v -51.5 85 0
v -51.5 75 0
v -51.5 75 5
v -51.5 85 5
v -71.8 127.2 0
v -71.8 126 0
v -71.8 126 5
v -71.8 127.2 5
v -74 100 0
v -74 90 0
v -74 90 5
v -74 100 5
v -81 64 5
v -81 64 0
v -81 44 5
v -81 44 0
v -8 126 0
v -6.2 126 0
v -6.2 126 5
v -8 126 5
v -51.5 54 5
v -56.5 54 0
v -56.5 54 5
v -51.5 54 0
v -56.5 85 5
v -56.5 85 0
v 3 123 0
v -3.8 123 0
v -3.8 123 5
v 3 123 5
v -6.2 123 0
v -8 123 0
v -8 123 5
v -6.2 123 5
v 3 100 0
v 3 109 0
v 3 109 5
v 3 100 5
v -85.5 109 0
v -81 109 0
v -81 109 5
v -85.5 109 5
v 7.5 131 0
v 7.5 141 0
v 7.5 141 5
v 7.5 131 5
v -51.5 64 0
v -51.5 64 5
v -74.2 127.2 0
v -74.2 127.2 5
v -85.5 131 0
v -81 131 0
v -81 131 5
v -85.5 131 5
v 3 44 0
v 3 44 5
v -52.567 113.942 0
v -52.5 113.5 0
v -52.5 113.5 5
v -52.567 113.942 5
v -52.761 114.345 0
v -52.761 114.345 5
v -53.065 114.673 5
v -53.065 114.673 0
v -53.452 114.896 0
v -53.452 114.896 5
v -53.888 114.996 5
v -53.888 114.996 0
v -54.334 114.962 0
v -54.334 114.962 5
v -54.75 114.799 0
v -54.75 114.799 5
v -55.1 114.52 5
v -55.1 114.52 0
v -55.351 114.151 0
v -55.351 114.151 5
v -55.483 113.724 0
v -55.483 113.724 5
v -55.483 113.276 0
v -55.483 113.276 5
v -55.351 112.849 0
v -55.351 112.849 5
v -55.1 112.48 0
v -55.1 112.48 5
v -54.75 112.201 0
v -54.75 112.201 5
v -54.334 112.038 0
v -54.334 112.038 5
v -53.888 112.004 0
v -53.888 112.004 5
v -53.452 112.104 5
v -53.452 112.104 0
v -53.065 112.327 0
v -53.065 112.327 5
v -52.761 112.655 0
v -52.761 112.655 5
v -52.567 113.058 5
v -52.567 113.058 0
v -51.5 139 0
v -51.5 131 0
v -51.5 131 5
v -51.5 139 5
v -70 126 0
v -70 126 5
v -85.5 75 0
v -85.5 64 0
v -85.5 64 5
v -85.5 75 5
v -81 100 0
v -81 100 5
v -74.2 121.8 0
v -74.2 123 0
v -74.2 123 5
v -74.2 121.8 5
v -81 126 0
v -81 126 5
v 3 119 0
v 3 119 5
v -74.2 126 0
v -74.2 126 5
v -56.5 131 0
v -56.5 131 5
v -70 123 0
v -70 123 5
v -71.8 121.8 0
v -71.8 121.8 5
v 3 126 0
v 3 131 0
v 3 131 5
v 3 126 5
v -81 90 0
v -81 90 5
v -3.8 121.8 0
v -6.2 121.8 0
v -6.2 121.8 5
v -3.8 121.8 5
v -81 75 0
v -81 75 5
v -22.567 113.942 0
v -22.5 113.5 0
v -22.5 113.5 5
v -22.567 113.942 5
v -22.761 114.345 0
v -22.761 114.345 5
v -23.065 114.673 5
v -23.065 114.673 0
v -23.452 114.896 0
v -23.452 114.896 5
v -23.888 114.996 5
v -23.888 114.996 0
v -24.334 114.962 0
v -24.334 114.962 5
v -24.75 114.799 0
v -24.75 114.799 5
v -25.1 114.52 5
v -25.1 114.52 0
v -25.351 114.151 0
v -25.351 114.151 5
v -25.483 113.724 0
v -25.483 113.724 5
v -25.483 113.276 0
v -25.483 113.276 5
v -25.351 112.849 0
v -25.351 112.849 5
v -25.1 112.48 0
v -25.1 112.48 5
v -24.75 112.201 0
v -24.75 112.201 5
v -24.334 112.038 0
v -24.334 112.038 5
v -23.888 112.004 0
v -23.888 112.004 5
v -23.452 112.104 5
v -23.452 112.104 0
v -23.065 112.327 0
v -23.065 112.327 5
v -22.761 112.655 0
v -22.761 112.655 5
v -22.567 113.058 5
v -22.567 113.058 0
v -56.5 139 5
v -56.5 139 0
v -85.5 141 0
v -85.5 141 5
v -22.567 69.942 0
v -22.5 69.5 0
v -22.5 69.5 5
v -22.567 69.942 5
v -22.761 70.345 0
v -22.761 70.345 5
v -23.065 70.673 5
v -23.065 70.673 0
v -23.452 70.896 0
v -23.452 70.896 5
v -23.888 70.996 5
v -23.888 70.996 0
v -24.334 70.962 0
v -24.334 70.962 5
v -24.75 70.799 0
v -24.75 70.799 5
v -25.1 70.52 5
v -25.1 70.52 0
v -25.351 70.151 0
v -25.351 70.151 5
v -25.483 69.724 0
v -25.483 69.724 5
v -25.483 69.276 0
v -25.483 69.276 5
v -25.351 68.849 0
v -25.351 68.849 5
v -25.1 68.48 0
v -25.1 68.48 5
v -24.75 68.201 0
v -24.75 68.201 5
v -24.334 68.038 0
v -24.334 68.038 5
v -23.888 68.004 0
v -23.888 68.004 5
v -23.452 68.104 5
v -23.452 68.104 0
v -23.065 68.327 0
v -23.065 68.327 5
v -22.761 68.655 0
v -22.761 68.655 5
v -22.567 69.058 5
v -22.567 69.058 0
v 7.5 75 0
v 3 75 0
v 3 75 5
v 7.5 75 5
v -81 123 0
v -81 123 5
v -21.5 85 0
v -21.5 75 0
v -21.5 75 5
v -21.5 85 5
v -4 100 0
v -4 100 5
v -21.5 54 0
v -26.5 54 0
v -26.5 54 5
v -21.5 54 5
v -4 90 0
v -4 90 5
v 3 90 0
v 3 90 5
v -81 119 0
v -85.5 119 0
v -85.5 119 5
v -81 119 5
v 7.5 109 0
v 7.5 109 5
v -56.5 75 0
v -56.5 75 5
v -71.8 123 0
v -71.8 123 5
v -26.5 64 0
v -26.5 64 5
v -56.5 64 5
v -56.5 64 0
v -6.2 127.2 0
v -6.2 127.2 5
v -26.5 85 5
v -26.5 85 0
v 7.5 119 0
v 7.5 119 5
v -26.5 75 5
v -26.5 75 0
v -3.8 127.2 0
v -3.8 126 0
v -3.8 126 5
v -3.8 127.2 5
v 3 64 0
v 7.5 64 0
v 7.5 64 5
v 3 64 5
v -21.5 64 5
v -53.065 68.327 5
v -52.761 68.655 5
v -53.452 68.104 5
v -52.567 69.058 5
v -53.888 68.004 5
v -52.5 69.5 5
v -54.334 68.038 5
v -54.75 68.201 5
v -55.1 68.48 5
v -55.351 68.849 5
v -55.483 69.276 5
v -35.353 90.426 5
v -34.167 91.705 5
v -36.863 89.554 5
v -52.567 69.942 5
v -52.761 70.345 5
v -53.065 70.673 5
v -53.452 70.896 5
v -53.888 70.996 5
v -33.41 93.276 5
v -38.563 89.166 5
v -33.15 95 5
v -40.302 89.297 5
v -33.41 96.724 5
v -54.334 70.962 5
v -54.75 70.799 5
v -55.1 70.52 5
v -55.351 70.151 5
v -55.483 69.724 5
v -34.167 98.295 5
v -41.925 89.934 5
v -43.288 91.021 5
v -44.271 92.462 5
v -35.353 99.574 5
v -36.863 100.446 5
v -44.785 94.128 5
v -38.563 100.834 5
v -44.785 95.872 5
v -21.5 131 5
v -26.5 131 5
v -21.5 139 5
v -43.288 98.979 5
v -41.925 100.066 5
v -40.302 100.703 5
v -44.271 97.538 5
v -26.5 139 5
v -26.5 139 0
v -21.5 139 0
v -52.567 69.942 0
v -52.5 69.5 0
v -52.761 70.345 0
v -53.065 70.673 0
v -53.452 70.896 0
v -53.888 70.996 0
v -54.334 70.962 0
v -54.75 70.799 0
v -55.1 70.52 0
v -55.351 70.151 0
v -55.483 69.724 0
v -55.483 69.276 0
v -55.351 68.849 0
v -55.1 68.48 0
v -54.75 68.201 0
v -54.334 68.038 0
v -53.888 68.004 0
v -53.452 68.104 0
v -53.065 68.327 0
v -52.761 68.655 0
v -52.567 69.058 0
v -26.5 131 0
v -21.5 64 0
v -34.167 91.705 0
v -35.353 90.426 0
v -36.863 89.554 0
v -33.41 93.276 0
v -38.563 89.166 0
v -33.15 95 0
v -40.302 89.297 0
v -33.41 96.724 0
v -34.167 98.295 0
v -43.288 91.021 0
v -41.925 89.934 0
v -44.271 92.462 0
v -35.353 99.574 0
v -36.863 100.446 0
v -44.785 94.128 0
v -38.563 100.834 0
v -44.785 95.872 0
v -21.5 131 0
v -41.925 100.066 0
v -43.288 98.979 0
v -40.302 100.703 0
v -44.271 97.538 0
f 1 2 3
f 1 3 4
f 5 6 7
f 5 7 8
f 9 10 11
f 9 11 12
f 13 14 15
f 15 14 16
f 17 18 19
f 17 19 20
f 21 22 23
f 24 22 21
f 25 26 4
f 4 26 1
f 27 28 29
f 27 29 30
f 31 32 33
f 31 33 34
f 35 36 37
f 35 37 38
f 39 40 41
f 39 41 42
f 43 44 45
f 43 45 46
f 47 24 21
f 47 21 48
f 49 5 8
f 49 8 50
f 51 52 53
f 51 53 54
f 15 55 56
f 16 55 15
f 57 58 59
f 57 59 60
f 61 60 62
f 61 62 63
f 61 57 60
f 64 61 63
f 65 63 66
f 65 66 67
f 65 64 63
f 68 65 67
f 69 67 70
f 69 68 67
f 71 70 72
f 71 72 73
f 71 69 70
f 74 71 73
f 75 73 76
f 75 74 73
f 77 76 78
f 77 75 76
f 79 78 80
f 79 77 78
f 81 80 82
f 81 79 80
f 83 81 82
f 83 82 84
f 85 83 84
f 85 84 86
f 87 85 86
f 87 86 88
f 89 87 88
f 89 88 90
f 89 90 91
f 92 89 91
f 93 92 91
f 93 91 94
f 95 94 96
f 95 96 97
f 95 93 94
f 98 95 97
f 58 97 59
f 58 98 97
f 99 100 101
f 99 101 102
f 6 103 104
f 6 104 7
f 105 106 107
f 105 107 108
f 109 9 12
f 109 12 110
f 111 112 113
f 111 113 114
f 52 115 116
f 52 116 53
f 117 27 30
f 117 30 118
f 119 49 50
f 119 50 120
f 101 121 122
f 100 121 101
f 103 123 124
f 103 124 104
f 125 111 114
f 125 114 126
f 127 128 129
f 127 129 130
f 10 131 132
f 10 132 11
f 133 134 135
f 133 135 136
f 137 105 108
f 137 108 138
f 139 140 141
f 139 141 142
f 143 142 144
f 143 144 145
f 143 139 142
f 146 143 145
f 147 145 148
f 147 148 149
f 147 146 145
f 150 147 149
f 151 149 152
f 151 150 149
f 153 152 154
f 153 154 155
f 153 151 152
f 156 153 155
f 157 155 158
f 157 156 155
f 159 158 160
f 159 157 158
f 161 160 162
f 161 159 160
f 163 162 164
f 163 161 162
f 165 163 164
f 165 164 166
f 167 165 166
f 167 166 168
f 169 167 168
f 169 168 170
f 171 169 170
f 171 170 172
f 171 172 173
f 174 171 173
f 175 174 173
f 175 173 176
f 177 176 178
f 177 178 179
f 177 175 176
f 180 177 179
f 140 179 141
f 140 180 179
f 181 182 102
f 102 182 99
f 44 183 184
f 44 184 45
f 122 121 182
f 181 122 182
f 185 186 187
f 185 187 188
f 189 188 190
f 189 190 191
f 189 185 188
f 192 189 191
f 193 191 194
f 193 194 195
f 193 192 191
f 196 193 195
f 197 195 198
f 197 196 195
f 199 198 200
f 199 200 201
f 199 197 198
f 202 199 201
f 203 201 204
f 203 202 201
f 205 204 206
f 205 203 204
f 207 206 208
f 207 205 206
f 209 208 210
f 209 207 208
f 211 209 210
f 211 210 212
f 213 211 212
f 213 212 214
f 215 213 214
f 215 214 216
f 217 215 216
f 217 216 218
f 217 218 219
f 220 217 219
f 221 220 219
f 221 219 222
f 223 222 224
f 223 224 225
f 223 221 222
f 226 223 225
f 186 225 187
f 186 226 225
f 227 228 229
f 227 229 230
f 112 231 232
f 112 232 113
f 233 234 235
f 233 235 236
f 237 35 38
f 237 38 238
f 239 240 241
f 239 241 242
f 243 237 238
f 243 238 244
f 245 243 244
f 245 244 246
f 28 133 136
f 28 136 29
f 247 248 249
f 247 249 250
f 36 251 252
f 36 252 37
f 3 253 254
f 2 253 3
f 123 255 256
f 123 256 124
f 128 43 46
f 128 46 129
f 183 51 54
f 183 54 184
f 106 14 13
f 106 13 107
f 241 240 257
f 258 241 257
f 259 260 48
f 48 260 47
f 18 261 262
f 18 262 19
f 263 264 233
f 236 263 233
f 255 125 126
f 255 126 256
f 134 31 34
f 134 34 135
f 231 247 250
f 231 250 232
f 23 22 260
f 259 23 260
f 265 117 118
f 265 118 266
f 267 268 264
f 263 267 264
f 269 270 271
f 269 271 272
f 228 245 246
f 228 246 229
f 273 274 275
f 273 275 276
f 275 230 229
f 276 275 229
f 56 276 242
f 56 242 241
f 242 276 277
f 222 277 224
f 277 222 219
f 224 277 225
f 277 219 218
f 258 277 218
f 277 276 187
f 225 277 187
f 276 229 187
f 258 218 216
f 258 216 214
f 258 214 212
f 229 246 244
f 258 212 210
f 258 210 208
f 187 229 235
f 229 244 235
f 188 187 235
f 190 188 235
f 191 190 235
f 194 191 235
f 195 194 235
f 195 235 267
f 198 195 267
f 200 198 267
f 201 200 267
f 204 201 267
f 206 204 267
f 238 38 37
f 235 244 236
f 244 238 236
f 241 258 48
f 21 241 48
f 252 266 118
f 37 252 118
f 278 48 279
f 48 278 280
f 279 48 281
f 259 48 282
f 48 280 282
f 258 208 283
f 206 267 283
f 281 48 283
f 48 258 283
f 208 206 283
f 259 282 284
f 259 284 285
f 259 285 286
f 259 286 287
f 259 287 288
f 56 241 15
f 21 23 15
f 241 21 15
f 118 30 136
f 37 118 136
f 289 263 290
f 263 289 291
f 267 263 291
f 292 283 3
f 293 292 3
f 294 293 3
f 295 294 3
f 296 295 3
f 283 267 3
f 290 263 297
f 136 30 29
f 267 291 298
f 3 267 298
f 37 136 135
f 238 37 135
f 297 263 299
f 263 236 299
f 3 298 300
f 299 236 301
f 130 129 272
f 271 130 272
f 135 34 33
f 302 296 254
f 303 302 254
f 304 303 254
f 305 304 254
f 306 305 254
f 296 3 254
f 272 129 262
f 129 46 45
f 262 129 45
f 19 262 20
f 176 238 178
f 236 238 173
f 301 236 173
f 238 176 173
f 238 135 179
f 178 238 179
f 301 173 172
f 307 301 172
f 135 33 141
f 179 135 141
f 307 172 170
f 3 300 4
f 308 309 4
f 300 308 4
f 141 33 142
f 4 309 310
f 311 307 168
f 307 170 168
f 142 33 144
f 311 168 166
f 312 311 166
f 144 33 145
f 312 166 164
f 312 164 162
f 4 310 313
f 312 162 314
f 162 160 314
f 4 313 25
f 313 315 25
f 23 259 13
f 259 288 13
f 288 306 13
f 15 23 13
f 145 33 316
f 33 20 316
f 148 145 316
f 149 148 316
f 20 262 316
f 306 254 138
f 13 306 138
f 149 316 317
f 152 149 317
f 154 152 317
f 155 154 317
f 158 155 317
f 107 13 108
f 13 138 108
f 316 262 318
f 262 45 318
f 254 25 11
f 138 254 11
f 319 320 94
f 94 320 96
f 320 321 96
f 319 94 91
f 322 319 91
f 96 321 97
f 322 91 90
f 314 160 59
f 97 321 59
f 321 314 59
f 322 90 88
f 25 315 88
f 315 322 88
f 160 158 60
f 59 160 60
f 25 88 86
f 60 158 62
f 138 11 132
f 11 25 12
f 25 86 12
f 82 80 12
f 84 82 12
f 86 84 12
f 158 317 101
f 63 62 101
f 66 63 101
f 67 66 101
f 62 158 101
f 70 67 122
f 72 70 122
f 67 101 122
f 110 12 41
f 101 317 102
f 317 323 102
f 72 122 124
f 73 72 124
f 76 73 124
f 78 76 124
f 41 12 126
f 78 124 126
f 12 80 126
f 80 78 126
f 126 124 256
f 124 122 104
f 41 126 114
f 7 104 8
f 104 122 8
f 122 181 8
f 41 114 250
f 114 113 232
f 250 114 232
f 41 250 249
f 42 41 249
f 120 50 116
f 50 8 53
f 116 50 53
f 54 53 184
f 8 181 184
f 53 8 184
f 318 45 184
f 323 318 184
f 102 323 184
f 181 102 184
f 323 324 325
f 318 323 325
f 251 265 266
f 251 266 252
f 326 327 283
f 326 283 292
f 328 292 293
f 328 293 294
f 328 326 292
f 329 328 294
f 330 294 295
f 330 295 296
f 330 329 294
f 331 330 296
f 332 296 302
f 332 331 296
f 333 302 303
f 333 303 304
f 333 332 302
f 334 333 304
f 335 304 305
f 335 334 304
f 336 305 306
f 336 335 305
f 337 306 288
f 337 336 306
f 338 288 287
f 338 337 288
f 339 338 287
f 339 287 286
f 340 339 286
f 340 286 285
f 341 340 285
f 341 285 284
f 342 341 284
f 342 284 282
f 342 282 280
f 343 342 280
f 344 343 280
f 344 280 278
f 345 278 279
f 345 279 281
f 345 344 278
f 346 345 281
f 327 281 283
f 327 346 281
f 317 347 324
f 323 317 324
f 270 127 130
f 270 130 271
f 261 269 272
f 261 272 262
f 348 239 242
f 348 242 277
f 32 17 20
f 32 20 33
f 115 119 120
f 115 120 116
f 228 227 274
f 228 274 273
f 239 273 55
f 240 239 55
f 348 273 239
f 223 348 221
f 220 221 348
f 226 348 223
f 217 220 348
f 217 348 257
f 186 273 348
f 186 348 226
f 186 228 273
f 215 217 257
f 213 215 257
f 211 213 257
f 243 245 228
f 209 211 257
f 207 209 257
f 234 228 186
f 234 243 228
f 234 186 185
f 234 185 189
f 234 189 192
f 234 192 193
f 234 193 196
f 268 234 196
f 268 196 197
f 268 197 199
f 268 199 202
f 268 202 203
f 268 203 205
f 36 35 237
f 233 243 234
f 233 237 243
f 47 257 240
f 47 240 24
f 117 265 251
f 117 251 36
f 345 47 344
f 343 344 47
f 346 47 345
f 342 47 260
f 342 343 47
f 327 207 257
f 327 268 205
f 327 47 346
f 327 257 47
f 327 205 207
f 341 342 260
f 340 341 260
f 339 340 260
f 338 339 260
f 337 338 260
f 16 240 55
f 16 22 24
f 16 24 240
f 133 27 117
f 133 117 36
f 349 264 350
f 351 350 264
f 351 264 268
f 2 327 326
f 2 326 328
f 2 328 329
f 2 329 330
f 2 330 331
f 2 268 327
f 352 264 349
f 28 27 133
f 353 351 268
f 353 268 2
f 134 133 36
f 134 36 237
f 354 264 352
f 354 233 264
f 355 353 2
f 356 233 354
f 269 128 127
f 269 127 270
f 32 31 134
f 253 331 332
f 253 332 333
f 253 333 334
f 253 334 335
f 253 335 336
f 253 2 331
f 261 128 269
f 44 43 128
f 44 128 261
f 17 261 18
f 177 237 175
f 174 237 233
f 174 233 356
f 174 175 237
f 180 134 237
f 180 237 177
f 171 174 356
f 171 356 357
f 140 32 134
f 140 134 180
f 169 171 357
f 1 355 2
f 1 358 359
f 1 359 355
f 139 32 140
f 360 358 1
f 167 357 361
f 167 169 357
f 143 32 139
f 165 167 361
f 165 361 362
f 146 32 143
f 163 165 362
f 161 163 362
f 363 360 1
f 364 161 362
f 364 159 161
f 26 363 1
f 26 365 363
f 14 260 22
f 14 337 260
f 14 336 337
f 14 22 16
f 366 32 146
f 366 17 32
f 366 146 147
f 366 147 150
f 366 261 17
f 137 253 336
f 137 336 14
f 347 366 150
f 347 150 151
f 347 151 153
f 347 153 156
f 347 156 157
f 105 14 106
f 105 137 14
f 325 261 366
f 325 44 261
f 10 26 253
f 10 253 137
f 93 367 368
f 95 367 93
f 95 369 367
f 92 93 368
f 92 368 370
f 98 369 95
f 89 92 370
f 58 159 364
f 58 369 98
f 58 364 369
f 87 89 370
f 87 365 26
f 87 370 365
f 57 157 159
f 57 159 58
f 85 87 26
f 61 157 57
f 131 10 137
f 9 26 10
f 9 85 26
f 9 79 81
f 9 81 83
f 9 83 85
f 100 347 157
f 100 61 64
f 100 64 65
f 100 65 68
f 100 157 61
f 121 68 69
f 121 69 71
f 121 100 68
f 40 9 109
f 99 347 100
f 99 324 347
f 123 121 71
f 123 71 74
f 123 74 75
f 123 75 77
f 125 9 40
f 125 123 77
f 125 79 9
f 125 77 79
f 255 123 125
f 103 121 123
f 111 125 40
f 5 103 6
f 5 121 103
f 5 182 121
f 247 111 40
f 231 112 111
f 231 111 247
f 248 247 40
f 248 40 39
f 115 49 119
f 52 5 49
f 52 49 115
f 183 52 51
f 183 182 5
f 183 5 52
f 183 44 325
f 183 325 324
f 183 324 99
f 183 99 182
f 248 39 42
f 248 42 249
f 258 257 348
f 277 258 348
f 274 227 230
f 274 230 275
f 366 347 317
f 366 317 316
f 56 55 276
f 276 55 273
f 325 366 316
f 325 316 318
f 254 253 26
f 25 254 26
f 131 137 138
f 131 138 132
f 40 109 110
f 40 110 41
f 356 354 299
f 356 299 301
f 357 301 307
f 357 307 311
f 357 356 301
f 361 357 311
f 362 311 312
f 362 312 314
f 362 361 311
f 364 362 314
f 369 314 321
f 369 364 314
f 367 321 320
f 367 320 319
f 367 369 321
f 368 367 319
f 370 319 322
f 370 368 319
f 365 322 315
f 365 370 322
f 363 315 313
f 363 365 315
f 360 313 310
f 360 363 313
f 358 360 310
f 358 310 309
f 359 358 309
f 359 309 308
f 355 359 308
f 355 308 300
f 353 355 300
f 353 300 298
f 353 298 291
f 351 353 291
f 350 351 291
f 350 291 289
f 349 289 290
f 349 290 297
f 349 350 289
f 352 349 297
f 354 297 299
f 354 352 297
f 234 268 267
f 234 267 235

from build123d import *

# Parameters (mm, degrees)
MODEL_R                  = 1.500000022
MODEL_R_2                = 5.85
MODEL_W                  = 5.000000237
MODEL_H                  = 10
MODEL_H_2                = 8.000000671
RESSALTO_EXTRUS_O1_DEPTH = 5


with BuildPart() as part:
    # Model → Ressalto-extrusão1 (new body)
    with BuildSketch(Plane.XY):
        Polygon((-85.499999911, 109.000001535), (-85.499999911, 119.000001535), (-80.999999874, 119.000001535), (-80.999999874, 123.000001432), (-74.199999284, 123.000001432), (-74.199999284, 121.80000149), (-71.799999703, 121.80000149), (-71.799999703, 123.000001432), (-69.999999218, 123.000001432), (-69.999999218, 126.000001536), (-71.799999703, 126.000001536), (-71.799999703, 127.200001477), (-74.199999284, 127.200001477), (-74.199999284, 126.000001536), (-80.999999874, 126.000001536), (-80.999999874, 131.000001773), (-85.499999911, 131.000001773), (-85.499999911, 141.000001773), (7.500000924, 141.000001773), (7.500000924, 131.000001773), (3.000000887, 131.000001773), (3.000000887, 126.000001536), (-3.799999703, 126.000001536), (-3.799999703, 127.200001477), (-6.199999284, 127.200001477), (-6.199999284, 126.000001536), (-7.999999768, 126.000001536), (-7.999999768, 123.000001432), (-6.199999284, 123.000001432), (-6.199999284, 121.80000149), (-3.799999703, 121.80000149), (-3.799999703, 123.000001432), (3.000000887, 123.000001432), (3.000000887, 119.000001535), (7.500000924, 119.000001535), (7.500000924, 109.000001535), (3.000000887, 109.000001535), (3.000000887, 100.000001104), (-3.999999248, 100.000001104), (-3.999999248, 90.000001104), (3.000000887, 90.000001104), (3.000000887, 75.000001296), (7.500000924, 75.000001296), (7.500000924, 64.000001177), (3.000000887, 64.000001177), (3.000000887, 63.000001432), (3.000000887, 44.000000821), (-80.999999874, 44.000000821), (-80.999999874, 63.000001432), (-80.999999874, 64.000001177), (-85.499999911, 64.000001177), (-85.499999911, 75.000001296), (-80.999999874, 75.000001296), (-80.999999874, 90.000001104), (-73.999999739, 90.000001104), (-73.999999739, 100.000001104), (-80.999999874, 100.000001104), (-80.999999874, 109.000001535), align=None)
        with Locations((-24.000000328, 113.500001691)):
            Circle(MODEL_R, mode=Mode.SUBTRACT)
        with Locations((-24.000000328, 69.500001036)):
            Circle(MODEL_R, mode=Mode.SUBTRACT)
        with Locations((-54.000000775, 113.500001691)):
            Circle(MODEL_R, mode=Mode.SUBTRACT)
        with Locations((-54.000000775, 69.500001036)):
            Circle(MODEL_R, mode=Mode.SUBTRACT)
        with Locations((-38.999999493, 95.000001416)):
            Circle(MODEL_R_2, mode=Mode.SUBTRACT)
        with Locations((-53.999999882, 59.000001177)):
            Rectangle(MODEL_W, MODEL_H, mode=Mode.SUBTRACT)
        with Locations((-24.000000119, 80.000001296)):
            Rectangle(MODEL_W, MODEL_H, mode=Mode.SUBTRACT)
        with Locations((-53.999999882, 135.000002109)):
            Rectangle(MODEL_W, MODEL_H_2, mode=Mode.SUBTRACT)
        with Locations((-24.000000119, 135.000002109)):
            Rectangle(MODEL_W, MODEL_H_2, mode=Mode.SUBTRACT)
        with Locations((-24.000000119, 59.000001177)):
            Rectangle(MODEL_W, MODEL_H, mode=Mode.SUBTRACT)
        with Locations((-53.999999882, 80.000001296)):
            Rectangle(MODEL_W, MODEL_H, mode=Mode.SUBTRACT)
    extrude(amount=RESSALTO_EXTRUS_O1_DEPTH)


solid = part.part
